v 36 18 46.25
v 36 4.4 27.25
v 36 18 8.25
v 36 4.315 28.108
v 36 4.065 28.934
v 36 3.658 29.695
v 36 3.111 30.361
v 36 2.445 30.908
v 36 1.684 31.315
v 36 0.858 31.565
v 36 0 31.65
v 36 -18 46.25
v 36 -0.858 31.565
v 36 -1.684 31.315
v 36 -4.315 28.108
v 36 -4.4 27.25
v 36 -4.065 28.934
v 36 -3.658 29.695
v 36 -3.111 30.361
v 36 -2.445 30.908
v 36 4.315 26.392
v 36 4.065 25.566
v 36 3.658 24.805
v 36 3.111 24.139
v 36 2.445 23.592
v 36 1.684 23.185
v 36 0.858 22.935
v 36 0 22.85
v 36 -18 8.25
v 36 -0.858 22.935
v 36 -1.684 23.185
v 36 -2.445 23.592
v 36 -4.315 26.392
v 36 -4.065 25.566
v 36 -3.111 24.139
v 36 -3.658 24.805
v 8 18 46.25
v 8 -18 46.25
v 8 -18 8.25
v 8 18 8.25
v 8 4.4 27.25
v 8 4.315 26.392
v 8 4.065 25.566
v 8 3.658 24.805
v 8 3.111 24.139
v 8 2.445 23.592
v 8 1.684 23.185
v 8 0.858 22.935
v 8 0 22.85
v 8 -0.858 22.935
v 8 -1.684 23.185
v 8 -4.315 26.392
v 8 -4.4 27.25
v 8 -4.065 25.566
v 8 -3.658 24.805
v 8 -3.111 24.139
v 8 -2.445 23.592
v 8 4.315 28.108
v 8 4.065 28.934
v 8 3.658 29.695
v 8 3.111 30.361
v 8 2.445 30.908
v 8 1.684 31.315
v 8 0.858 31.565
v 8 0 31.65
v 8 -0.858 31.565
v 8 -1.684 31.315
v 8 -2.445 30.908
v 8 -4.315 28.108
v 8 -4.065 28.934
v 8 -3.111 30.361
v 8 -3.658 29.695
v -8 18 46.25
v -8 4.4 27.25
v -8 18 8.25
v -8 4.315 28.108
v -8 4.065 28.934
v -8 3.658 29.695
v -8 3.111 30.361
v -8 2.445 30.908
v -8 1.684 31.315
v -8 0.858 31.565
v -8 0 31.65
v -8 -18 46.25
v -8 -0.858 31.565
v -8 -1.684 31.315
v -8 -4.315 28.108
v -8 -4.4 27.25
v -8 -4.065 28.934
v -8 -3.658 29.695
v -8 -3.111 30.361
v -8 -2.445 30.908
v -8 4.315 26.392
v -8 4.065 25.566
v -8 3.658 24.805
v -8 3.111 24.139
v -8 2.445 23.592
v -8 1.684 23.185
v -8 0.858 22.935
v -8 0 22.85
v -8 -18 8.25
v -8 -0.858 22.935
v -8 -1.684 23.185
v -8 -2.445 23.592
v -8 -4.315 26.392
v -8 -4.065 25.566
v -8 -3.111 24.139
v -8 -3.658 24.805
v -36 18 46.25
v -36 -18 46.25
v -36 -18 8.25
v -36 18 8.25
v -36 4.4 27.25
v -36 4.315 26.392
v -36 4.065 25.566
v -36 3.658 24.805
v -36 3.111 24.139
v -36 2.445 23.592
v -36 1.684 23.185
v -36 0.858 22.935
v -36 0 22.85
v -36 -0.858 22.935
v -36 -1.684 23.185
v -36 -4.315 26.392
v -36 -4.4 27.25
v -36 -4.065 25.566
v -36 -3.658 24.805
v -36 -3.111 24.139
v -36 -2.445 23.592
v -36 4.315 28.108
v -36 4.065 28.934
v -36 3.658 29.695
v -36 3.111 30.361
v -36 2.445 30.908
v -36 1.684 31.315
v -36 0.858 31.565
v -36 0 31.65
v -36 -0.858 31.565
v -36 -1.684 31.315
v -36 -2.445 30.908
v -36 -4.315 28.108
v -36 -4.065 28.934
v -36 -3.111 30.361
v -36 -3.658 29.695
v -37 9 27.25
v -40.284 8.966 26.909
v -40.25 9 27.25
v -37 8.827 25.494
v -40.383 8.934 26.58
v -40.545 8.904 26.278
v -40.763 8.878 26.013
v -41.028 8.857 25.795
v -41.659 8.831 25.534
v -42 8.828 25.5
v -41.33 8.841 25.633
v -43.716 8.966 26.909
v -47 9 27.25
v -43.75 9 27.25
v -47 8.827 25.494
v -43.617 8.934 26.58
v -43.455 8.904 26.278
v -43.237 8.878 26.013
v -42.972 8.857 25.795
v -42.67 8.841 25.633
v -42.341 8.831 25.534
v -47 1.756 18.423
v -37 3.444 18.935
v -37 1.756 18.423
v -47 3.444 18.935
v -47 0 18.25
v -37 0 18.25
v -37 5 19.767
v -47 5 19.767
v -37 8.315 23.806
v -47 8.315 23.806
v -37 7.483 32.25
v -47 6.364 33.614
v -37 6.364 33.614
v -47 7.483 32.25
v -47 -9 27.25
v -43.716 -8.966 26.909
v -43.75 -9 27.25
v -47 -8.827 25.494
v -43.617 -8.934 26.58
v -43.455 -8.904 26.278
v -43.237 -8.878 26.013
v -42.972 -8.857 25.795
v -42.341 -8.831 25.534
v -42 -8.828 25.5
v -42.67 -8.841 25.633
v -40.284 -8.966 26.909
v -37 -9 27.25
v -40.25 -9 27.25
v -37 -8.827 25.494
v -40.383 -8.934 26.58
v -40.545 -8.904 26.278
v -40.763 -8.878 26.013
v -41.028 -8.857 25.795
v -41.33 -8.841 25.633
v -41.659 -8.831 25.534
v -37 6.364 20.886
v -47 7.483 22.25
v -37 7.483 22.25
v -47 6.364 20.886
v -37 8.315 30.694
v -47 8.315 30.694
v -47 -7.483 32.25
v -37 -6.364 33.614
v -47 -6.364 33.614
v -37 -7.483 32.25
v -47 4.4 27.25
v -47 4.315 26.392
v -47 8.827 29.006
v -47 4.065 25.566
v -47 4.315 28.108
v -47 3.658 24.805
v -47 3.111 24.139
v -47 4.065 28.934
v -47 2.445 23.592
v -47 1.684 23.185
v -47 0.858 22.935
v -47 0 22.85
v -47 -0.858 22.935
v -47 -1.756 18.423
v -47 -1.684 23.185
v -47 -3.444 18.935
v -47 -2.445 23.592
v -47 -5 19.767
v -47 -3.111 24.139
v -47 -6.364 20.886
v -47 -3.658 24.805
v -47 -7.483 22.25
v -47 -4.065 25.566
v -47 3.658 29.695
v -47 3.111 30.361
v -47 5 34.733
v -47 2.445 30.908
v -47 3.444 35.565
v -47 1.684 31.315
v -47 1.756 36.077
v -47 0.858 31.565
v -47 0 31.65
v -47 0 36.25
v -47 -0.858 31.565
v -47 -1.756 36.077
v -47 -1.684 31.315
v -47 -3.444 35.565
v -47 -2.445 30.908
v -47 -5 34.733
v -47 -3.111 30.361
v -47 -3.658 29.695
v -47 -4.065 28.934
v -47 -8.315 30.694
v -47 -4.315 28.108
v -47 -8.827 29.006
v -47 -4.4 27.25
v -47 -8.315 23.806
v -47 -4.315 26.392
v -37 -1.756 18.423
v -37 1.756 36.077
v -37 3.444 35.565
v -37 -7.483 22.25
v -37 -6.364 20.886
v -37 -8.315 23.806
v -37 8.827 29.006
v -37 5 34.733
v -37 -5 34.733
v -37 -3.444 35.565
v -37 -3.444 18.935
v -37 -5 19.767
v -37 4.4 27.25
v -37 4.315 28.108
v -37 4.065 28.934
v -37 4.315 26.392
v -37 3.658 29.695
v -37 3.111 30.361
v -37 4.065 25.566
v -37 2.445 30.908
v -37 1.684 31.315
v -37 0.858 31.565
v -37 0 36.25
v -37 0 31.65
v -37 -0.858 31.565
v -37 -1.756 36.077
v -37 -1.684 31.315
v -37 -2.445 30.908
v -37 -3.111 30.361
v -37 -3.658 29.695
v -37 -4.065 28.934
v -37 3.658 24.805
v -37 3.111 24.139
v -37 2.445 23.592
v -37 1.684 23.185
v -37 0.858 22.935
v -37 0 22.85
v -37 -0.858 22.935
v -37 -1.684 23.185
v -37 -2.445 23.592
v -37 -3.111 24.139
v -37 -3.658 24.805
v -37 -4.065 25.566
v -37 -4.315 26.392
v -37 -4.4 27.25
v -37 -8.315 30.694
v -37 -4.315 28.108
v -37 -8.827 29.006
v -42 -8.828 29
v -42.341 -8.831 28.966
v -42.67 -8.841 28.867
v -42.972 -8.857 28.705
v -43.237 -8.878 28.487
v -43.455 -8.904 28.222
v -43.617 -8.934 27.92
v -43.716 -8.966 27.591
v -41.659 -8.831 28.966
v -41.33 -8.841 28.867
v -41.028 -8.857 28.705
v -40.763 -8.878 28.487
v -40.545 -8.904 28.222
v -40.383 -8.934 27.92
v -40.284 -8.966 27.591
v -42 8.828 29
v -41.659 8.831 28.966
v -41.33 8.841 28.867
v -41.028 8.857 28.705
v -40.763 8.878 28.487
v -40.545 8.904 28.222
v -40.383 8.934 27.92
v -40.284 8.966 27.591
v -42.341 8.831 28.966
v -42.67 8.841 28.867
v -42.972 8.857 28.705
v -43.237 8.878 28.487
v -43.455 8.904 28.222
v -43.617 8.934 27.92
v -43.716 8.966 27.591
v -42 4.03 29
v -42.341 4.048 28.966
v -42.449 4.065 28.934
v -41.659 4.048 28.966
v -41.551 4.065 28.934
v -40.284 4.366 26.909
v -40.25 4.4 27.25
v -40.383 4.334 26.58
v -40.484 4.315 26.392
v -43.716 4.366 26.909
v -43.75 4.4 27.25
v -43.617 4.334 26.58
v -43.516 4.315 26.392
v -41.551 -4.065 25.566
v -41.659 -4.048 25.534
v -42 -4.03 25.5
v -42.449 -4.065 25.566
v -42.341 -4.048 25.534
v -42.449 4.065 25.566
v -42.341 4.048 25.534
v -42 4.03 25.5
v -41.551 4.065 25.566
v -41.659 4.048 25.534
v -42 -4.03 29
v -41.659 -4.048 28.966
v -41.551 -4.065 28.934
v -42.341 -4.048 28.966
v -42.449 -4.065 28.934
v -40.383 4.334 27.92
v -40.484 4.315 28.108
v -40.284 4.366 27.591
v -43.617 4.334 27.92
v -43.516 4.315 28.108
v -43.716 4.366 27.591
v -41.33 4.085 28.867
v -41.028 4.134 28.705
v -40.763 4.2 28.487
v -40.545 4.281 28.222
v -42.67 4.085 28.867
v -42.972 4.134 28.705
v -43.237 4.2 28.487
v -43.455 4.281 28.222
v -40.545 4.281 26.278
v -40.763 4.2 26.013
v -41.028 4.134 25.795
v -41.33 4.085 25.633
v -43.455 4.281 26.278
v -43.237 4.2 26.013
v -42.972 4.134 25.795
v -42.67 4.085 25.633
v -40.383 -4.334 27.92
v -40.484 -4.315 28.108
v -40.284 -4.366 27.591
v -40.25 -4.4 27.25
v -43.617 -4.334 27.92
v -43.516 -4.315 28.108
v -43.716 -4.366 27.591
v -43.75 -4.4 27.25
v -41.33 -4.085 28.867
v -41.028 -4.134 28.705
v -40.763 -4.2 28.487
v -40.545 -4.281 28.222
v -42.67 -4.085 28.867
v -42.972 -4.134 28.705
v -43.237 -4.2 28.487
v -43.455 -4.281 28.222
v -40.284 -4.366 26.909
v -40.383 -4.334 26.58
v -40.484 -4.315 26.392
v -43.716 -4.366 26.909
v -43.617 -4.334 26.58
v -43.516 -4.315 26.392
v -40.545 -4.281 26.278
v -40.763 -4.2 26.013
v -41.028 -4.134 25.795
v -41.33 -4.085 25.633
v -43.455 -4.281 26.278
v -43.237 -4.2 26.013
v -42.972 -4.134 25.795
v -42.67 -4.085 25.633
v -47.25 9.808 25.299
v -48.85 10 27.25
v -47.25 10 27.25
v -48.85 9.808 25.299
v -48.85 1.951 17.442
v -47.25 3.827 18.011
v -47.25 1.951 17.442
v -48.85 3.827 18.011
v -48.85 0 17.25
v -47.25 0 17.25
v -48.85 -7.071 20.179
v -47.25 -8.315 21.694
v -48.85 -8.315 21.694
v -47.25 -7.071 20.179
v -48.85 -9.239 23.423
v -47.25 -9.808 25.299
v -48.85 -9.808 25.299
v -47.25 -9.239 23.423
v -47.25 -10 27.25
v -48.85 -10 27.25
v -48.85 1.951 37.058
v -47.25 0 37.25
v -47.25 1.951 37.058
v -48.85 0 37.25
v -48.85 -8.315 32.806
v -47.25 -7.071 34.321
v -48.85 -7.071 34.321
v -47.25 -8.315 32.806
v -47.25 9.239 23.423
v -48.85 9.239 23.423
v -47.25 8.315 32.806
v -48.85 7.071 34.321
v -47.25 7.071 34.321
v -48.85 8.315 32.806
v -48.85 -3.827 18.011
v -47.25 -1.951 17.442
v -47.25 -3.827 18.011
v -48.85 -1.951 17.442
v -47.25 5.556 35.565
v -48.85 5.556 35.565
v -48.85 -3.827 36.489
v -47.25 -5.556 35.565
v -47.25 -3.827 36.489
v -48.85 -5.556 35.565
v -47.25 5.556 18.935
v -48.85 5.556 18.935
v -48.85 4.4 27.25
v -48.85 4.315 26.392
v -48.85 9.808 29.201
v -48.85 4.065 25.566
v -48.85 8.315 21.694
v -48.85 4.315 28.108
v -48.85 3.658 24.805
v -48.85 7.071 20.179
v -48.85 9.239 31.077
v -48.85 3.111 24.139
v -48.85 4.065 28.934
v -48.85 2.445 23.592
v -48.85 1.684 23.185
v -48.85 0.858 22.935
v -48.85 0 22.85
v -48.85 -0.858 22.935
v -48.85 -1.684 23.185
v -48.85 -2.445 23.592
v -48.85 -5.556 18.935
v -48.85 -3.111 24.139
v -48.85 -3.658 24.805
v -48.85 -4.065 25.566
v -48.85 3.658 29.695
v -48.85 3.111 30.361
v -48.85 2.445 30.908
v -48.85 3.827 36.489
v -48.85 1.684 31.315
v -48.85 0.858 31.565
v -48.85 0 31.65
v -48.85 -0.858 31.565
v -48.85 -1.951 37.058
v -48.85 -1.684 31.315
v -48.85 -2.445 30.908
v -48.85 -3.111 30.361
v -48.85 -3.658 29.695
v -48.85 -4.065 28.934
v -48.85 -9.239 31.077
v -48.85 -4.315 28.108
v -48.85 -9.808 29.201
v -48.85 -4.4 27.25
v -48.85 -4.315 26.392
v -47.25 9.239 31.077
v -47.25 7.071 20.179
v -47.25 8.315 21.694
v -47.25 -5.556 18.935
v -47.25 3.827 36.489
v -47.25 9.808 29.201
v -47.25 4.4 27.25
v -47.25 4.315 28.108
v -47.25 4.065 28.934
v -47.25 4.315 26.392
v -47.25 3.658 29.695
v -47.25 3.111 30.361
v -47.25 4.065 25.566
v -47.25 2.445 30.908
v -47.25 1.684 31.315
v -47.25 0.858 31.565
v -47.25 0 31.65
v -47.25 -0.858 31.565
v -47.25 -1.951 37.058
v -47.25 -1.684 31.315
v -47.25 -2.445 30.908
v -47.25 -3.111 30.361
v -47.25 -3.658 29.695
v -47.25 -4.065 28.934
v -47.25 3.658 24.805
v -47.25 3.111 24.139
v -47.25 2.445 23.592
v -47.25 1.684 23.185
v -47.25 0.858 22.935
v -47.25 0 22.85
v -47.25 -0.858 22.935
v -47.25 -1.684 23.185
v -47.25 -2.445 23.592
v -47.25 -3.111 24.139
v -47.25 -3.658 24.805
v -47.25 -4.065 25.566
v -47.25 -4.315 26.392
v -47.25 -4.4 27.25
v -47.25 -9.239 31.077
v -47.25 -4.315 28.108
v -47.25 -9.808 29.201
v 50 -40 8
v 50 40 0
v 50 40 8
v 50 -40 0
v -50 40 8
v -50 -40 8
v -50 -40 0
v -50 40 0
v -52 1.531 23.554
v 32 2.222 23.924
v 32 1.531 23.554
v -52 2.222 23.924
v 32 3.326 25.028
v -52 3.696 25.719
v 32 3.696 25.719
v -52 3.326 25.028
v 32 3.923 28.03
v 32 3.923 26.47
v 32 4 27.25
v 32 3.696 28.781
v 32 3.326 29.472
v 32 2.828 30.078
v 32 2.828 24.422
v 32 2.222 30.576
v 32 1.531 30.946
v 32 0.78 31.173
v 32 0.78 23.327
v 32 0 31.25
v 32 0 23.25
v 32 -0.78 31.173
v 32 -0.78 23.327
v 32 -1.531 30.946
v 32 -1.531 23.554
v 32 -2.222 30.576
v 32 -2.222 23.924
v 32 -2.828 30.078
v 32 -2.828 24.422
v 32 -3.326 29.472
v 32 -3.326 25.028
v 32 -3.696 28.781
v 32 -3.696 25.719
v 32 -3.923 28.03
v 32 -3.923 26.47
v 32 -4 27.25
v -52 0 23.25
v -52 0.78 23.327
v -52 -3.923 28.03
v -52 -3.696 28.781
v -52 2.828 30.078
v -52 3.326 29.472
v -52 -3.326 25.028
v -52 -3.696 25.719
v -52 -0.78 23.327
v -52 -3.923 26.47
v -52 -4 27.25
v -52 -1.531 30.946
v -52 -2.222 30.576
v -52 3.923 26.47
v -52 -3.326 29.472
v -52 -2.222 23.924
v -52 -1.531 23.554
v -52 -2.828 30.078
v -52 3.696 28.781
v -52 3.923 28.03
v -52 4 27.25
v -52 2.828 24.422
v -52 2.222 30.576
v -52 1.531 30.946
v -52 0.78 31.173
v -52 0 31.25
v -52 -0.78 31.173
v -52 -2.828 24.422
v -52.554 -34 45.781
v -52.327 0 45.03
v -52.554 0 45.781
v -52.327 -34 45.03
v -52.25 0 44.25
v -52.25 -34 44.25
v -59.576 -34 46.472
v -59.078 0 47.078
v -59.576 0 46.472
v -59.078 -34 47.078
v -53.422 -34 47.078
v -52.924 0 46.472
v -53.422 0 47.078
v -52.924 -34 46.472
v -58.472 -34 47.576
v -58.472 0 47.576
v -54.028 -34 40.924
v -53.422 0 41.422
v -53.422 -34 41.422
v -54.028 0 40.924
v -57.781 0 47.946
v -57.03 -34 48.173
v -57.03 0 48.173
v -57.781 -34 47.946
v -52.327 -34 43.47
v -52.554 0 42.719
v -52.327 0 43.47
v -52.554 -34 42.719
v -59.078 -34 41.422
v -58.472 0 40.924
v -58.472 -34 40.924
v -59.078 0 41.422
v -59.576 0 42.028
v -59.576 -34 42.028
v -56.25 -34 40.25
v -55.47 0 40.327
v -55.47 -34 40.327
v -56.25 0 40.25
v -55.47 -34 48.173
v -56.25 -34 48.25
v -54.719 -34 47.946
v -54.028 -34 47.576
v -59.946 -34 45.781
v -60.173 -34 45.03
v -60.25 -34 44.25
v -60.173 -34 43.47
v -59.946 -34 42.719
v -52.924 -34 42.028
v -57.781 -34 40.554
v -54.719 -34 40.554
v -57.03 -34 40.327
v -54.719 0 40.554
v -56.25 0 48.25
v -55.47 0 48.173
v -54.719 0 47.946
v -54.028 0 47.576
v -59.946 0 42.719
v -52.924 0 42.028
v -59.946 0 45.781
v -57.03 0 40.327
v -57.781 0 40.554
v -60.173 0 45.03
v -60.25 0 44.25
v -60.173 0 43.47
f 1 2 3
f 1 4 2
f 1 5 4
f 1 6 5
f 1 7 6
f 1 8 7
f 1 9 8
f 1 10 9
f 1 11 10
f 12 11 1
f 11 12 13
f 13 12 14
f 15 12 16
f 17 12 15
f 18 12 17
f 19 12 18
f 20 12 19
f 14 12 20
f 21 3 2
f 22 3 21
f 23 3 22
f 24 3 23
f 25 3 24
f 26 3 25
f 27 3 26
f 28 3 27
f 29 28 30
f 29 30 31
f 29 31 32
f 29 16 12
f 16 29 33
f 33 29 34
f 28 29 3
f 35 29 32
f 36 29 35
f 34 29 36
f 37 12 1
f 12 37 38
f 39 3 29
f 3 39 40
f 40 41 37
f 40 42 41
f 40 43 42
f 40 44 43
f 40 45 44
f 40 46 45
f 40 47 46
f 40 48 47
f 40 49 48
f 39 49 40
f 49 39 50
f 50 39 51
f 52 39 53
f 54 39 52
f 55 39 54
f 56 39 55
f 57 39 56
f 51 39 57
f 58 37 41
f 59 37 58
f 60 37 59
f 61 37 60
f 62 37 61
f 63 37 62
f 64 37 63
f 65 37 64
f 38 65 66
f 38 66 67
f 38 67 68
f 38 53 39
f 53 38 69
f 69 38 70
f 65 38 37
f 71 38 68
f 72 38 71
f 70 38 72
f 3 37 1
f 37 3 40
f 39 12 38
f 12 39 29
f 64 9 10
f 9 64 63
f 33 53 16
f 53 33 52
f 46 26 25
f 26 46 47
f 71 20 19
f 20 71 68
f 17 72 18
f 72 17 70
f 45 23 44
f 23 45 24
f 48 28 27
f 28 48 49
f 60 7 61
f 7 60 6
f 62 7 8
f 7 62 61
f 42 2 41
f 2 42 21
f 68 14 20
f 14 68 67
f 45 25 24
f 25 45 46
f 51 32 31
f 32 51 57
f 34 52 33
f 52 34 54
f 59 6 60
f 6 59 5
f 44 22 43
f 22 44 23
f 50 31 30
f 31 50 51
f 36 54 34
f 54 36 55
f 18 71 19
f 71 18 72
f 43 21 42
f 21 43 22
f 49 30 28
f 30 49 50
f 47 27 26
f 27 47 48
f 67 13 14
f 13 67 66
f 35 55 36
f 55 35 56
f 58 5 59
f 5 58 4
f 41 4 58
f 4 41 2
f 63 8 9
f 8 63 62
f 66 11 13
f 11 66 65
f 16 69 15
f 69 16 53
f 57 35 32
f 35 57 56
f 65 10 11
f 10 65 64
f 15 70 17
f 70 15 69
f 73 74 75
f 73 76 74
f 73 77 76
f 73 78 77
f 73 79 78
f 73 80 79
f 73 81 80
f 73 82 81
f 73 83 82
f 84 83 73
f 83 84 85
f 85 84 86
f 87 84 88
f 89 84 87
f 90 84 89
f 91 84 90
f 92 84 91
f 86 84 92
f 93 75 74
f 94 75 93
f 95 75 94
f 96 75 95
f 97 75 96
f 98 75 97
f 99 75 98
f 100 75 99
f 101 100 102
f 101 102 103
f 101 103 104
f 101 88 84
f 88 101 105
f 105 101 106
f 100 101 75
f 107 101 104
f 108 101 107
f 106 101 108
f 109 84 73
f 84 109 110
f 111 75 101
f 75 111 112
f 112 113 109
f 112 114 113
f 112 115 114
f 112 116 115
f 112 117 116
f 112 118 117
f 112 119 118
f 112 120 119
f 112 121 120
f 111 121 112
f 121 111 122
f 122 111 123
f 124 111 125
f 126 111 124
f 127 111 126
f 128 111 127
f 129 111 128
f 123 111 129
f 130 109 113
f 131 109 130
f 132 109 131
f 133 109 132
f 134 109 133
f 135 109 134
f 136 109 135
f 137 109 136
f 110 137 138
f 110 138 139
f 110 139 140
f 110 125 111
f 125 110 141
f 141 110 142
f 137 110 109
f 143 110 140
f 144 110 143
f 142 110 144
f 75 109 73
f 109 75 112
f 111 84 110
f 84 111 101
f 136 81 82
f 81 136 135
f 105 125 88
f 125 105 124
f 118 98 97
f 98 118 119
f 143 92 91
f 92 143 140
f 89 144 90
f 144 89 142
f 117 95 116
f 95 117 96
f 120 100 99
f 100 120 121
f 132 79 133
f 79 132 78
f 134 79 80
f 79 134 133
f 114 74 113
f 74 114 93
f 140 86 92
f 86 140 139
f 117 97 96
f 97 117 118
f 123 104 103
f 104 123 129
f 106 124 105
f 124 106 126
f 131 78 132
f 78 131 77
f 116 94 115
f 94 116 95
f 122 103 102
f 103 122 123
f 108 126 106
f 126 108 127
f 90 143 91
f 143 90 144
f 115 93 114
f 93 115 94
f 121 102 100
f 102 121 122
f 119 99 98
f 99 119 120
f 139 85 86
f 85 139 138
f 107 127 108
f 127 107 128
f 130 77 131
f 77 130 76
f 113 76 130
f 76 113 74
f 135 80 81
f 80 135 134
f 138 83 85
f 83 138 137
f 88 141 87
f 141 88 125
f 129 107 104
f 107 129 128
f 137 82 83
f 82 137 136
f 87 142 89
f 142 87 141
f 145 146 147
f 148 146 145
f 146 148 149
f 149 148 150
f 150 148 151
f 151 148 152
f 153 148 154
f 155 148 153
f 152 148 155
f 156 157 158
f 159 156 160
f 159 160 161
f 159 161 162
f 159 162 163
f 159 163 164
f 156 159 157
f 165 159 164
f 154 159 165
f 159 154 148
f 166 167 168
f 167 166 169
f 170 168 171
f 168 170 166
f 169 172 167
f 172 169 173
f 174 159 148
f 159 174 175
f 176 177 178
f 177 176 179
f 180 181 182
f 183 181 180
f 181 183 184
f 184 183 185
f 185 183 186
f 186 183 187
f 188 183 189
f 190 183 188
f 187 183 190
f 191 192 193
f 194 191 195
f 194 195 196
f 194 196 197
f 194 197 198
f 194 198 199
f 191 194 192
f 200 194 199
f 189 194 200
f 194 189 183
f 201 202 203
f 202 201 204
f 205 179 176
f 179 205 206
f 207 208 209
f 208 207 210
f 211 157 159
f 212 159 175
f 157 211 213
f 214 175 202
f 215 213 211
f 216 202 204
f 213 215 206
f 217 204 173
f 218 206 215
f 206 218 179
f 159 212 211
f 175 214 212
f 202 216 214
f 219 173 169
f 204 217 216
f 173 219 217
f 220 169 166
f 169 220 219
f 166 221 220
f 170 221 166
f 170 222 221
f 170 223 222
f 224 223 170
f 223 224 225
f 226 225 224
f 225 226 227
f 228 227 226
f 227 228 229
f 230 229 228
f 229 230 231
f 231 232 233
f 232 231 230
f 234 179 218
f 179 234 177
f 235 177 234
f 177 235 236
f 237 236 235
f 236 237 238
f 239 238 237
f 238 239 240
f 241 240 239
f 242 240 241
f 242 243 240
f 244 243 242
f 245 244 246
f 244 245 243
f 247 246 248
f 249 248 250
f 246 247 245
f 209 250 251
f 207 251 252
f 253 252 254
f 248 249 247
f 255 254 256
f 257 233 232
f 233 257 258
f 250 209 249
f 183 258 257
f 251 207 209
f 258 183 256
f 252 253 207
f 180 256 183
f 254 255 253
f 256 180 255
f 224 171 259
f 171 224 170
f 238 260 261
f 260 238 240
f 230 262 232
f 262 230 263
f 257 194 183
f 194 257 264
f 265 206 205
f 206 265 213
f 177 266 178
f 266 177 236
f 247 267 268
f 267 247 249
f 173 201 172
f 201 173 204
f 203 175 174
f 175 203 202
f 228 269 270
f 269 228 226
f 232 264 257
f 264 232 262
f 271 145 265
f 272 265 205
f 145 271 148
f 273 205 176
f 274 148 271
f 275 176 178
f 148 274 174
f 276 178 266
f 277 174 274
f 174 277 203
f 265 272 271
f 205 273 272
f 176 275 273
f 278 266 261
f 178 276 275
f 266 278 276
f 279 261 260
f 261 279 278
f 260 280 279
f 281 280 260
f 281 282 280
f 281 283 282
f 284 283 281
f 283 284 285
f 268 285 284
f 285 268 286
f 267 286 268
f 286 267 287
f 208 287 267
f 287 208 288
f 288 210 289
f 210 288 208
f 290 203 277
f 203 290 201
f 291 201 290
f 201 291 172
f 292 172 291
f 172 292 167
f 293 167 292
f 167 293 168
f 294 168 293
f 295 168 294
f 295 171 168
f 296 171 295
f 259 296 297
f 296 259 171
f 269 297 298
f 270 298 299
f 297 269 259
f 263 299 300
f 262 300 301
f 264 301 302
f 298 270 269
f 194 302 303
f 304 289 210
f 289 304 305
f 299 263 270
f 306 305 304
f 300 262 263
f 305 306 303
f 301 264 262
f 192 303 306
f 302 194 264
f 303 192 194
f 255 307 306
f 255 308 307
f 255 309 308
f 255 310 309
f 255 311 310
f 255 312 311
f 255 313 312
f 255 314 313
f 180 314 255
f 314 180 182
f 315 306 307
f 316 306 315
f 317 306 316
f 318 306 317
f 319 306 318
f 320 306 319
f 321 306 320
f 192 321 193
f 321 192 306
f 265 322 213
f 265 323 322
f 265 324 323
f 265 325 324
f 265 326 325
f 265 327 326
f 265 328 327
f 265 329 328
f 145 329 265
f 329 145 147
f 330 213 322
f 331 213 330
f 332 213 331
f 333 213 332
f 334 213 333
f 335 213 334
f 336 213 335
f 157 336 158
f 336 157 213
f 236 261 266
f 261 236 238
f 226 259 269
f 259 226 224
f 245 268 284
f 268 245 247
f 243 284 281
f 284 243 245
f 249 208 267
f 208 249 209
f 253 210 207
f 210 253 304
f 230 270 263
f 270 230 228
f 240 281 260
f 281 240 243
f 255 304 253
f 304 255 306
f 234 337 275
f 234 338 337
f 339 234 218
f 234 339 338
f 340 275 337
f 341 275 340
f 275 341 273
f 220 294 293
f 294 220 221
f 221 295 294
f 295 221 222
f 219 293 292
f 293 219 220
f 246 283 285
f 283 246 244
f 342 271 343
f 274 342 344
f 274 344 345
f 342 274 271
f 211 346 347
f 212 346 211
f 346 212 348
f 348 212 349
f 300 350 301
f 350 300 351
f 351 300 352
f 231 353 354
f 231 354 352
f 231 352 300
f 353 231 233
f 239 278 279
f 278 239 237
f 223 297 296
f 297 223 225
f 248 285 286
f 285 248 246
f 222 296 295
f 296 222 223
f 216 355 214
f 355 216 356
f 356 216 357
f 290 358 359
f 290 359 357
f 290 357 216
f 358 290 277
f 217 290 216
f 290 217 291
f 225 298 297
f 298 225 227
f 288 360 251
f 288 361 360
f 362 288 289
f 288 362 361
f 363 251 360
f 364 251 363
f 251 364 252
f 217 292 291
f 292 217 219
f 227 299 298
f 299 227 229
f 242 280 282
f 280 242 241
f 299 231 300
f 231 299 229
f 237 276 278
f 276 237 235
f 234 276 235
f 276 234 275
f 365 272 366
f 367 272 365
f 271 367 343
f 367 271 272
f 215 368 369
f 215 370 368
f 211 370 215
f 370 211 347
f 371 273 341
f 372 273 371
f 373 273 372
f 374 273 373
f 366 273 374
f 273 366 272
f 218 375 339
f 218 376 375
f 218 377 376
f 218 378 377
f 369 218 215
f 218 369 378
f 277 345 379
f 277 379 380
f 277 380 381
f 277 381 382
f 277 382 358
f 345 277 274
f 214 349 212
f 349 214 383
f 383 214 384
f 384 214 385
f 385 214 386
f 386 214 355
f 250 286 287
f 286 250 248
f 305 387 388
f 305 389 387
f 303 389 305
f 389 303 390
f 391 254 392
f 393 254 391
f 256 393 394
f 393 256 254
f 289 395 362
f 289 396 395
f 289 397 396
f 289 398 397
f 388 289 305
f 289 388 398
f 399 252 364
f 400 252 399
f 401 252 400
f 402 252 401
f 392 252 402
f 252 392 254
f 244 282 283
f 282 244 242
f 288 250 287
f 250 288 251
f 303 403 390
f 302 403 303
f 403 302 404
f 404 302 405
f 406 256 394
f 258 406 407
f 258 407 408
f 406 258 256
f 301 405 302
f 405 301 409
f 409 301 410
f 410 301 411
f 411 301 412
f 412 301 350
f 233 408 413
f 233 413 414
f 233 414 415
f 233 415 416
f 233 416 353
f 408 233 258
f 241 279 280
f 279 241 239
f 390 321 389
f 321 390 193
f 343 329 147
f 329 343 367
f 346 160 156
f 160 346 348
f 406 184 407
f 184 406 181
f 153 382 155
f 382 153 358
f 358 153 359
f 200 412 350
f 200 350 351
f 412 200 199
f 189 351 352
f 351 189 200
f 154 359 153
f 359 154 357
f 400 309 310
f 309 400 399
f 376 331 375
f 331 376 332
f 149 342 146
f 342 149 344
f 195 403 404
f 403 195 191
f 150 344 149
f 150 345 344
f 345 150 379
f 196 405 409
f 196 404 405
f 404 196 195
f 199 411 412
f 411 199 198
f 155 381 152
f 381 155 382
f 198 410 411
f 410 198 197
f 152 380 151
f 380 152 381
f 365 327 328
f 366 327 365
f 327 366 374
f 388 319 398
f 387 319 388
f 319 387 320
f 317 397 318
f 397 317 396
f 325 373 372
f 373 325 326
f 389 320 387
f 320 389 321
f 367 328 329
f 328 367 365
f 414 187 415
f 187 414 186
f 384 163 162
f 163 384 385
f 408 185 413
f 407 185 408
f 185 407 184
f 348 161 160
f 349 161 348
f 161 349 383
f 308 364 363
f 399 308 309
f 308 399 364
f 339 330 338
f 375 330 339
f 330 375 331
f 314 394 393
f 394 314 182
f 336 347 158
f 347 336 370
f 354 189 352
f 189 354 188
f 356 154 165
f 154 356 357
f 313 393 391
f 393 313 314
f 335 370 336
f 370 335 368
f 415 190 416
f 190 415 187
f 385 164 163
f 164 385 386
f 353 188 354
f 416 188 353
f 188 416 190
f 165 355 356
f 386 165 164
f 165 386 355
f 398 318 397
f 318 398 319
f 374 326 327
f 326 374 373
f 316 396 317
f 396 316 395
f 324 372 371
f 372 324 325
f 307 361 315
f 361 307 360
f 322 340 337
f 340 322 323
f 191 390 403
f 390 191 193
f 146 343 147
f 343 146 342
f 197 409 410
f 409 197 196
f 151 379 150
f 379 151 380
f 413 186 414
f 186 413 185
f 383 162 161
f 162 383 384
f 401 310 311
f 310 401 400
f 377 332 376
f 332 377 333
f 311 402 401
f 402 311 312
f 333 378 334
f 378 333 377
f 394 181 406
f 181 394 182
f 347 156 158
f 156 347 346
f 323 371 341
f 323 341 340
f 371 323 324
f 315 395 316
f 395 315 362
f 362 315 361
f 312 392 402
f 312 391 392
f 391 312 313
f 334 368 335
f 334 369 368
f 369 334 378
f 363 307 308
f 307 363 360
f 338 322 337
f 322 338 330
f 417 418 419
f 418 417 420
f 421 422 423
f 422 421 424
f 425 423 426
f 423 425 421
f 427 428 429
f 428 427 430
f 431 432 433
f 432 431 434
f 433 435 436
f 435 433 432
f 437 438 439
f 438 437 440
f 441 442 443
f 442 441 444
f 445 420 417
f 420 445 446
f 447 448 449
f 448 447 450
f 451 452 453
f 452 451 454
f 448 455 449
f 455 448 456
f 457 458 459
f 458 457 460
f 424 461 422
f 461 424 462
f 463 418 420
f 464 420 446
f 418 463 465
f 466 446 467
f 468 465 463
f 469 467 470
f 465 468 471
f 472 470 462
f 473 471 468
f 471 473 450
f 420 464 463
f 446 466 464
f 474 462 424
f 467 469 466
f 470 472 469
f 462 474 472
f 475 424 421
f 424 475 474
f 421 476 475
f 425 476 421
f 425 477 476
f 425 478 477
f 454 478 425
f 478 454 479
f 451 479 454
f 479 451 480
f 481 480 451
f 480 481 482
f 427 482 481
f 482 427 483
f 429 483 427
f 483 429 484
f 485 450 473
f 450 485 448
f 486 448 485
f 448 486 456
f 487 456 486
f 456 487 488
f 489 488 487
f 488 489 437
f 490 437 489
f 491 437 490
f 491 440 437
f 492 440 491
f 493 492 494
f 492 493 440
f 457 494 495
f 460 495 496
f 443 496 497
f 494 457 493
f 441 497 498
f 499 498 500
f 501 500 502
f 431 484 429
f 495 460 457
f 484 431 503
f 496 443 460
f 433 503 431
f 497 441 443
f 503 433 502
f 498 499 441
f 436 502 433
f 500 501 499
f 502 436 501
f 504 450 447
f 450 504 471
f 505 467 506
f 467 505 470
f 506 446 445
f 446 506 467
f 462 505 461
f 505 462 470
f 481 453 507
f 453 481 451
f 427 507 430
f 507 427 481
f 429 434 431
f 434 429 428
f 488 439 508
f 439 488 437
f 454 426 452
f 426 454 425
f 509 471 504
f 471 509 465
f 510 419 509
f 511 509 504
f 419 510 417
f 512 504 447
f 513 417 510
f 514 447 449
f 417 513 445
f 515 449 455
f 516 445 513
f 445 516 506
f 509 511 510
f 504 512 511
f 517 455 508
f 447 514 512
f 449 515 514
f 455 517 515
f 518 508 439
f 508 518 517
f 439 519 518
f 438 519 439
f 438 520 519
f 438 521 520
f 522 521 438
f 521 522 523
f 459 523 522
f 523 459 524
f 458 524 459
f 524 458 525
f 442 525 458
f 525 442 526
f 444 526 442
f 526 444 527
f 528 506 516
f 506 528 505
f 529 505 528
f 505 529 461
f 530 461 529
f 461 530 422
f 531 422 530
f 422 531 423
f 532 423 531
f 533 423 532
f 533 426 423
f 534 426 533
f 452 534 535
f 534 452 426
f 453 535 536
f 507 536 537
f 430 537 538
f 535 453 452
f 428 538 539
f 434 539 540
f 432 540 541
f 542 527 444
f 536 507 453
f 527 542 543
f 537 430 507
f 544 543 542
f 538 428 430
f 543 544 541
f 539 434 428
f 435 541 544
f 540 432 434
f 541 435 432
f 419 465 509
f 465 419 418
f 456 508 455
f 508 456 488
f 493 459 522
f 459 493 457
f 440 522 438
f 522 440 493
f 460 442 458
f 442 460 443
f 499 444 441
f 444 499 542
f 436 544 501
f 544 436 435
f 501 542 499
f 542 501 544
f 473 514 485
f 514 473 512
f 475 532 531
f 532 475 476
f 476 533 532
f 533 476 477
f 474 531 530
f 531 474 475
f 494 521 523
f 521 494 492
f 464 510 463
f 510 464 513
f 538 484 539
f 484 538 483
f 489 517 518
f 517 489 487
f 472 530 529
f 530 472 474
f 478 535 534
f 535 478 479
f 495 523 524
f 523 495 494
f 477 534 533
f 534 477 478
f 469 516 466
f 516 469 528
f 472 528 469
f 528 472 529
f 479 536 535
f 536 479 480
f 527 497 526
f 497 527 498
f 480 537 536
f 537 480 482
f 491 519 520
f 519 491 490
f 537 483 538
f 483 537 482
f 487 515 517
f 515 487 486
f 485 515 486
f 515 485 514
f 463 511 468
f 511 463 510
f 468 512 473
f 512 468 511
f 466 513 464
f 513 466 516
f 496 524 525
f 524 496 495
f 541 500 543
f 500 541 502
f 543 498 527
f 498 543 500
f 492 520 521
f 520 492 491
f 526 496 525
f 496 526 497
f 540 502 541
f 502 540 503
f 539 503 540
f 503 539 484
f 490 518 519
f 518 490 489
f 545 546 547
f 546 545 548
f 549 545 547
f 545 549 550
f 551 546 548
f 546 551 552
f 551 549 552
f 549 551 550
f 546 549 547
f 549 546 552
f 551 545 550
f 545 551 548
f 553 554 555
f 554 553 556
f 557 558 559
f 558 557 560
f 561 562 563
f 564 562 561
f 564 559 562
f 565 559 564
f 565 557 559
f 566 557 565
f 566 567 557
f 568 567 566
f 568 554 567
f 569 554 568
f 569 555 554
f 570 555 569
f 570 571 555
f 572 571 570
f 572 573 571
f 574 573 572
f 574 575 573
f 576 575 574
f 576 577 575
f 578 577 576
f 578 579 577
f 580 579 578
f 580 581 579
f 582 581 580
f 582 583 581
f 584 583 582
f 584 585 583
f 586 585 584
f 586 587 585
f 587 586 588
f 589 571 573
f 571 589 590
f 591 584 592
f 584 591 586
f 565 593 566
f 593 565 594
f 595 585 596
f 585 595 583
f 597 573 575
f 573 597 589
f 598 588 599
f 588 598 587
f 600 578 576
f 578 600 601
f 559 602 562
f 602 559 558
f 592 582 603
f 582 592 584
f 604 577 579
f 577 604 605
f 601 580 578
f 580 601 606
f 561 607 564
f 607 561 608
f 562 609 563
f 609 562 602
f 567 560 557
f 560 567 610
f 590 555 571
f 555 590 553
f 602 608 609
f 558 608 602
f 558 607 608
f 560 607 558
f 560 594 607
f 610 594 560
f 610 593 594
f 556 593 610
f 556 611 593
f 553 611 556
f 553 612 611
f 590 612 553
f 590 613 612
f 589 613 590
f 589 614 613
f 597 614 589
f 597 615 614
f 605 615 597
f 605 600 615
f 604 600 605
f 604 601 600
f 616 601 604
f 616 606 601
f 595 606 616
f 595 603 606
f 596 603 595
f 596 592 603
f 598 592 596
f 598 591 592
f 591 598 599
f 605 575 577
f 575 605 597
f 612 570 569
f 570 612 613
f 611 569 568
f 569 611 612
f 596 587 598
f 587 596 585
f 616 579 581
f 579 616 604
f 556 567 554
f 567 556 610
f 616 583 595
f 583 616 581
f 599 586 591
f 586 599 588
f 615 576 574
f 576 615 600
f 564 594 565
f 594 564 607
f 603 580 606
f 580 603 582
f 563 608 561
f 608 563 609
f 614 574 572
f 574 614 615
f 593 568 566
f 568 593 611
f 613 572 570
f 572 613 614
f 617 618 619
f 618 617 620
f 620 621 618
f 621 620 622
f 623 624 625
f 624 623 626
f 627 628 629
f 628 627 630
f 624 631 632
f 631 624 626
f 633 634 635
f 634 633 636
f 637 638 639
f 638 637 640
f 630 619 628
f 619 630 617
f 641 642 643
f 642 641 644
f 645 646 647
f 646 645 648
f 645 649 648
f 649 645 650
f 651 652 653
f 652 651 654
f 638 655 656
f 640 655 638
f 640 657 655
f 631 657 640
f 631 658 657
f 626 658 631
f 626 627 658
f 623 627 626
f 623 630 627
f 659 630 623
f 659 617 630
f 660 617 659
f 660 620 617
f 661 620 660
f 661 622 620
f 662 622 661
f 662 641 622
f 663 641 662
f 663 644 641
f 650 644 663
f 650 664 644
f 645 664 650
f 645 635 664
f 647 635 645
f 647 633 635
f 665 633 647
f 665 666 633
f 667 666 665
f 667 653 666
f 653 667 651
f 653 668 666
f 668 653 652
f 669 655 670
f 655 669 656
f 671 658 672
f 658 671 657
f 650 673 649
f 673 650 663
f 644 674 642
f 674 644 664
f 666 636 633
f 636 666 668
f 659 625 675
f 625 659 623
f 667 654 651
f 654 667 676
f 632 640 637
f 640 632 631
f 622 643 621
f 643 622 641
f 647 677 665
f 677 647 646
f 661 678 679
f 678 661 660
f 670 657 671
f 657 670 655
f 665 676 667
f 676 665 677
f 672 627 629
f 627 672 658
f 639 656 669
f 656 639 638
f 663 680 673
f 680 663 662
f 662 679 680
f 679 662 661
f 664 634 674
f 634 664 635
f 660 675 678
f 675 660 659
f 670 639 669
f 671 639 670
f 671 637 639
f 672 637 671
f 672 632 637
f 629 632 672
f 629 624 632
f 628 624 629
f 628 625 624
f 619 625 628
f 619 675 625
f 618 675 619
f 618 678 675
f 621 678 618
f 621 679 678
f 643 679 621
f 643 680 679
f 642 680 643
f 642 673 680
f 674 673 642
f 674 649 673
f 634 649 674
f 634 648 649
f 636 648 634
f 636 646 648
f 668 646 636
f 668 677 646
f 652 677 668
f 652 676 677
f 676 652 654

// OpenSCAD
$fn = 32;

// ------------------------------------------------------------------------
// Machine vise: screw d8, jaws 28 x 38 mm
// Every part is its own module, assembly() places every instance.
// ------------------------------------------------------------------------

// --- part 1 ---
module vise_bed() {
  difference() {
    translate([-50, -40, 0]) cube([100, 80, 8]);
  }
}

// --- part 2 ---
module vise_jaw() {
  difference() {
    translate([-14, -18, 0]) cube([28, 36, 38]);
    translate([0, 0, 19]) rotate([0, 90, 0]) cylinder(h = 30, d = 8.8, center = true);
  }
}

// --- part 3 ---
module vise_screw() {
  translate([0, 0, -42]) cylinder(h = 84, d = 8);
}

// --- part 4 ---
module screw_collar() {
  difference() {
    cylinder(h = 10, d = 18);
    translate([0, 0, -1]) cylinder(h = 12, d = 8.8);
    translate([0, 0, 5]) rotate([90, 0, 0]) cylinder(h = 20, d = 3.5, center = true);
  }
}

// --- part 5 ---
module screw_washer() {
  difference() {
      translate([0, 0, 0]) cylinder(h = 1.6, d = 20);
      translate([0, 0, -1]) cylinder(h = 3.6, d = 8.8);
    }
}

// --- part 6 ---
module vise_handle() {
  cylinder(h = 34, d = 8);
}

// --- assembly ---
module assembly() {
  color([0.80, 0.24, 0.20]) translate([0, 0, 0]) rotate([0, 0, 0]) vise_bed();
  color([0.20, 0.45, 0.75]) translate([22, 0, 8.25]) rotate([0, 0, 0]) vise_jaw();
  color([0.25, 0.62, 0.32]) translate([-22, 0, 8.25]) rotate([0, 0, 0]) vise_jaw();
  color([0.92, 0.70, 0.18]) translate([-10, 0, 27.25]) rotate([0, 90, 0]) vise_screw();
  color([0.58, 0.35, 0.70]) translate([-47, 0, 27.25]) rotate([0, 90, 0]) screw_collar();
  color([0.16, 0.66, 0.66]) translate([-48.85, 0, 27.25]) rotate([0, 90, 0]) screw_washer();
  color([0.85, 0.48, 0.18]) translate([-56.25, 0, 44.25]) rotate([90, 0, 0]) vise_handle();
}

assembly();
